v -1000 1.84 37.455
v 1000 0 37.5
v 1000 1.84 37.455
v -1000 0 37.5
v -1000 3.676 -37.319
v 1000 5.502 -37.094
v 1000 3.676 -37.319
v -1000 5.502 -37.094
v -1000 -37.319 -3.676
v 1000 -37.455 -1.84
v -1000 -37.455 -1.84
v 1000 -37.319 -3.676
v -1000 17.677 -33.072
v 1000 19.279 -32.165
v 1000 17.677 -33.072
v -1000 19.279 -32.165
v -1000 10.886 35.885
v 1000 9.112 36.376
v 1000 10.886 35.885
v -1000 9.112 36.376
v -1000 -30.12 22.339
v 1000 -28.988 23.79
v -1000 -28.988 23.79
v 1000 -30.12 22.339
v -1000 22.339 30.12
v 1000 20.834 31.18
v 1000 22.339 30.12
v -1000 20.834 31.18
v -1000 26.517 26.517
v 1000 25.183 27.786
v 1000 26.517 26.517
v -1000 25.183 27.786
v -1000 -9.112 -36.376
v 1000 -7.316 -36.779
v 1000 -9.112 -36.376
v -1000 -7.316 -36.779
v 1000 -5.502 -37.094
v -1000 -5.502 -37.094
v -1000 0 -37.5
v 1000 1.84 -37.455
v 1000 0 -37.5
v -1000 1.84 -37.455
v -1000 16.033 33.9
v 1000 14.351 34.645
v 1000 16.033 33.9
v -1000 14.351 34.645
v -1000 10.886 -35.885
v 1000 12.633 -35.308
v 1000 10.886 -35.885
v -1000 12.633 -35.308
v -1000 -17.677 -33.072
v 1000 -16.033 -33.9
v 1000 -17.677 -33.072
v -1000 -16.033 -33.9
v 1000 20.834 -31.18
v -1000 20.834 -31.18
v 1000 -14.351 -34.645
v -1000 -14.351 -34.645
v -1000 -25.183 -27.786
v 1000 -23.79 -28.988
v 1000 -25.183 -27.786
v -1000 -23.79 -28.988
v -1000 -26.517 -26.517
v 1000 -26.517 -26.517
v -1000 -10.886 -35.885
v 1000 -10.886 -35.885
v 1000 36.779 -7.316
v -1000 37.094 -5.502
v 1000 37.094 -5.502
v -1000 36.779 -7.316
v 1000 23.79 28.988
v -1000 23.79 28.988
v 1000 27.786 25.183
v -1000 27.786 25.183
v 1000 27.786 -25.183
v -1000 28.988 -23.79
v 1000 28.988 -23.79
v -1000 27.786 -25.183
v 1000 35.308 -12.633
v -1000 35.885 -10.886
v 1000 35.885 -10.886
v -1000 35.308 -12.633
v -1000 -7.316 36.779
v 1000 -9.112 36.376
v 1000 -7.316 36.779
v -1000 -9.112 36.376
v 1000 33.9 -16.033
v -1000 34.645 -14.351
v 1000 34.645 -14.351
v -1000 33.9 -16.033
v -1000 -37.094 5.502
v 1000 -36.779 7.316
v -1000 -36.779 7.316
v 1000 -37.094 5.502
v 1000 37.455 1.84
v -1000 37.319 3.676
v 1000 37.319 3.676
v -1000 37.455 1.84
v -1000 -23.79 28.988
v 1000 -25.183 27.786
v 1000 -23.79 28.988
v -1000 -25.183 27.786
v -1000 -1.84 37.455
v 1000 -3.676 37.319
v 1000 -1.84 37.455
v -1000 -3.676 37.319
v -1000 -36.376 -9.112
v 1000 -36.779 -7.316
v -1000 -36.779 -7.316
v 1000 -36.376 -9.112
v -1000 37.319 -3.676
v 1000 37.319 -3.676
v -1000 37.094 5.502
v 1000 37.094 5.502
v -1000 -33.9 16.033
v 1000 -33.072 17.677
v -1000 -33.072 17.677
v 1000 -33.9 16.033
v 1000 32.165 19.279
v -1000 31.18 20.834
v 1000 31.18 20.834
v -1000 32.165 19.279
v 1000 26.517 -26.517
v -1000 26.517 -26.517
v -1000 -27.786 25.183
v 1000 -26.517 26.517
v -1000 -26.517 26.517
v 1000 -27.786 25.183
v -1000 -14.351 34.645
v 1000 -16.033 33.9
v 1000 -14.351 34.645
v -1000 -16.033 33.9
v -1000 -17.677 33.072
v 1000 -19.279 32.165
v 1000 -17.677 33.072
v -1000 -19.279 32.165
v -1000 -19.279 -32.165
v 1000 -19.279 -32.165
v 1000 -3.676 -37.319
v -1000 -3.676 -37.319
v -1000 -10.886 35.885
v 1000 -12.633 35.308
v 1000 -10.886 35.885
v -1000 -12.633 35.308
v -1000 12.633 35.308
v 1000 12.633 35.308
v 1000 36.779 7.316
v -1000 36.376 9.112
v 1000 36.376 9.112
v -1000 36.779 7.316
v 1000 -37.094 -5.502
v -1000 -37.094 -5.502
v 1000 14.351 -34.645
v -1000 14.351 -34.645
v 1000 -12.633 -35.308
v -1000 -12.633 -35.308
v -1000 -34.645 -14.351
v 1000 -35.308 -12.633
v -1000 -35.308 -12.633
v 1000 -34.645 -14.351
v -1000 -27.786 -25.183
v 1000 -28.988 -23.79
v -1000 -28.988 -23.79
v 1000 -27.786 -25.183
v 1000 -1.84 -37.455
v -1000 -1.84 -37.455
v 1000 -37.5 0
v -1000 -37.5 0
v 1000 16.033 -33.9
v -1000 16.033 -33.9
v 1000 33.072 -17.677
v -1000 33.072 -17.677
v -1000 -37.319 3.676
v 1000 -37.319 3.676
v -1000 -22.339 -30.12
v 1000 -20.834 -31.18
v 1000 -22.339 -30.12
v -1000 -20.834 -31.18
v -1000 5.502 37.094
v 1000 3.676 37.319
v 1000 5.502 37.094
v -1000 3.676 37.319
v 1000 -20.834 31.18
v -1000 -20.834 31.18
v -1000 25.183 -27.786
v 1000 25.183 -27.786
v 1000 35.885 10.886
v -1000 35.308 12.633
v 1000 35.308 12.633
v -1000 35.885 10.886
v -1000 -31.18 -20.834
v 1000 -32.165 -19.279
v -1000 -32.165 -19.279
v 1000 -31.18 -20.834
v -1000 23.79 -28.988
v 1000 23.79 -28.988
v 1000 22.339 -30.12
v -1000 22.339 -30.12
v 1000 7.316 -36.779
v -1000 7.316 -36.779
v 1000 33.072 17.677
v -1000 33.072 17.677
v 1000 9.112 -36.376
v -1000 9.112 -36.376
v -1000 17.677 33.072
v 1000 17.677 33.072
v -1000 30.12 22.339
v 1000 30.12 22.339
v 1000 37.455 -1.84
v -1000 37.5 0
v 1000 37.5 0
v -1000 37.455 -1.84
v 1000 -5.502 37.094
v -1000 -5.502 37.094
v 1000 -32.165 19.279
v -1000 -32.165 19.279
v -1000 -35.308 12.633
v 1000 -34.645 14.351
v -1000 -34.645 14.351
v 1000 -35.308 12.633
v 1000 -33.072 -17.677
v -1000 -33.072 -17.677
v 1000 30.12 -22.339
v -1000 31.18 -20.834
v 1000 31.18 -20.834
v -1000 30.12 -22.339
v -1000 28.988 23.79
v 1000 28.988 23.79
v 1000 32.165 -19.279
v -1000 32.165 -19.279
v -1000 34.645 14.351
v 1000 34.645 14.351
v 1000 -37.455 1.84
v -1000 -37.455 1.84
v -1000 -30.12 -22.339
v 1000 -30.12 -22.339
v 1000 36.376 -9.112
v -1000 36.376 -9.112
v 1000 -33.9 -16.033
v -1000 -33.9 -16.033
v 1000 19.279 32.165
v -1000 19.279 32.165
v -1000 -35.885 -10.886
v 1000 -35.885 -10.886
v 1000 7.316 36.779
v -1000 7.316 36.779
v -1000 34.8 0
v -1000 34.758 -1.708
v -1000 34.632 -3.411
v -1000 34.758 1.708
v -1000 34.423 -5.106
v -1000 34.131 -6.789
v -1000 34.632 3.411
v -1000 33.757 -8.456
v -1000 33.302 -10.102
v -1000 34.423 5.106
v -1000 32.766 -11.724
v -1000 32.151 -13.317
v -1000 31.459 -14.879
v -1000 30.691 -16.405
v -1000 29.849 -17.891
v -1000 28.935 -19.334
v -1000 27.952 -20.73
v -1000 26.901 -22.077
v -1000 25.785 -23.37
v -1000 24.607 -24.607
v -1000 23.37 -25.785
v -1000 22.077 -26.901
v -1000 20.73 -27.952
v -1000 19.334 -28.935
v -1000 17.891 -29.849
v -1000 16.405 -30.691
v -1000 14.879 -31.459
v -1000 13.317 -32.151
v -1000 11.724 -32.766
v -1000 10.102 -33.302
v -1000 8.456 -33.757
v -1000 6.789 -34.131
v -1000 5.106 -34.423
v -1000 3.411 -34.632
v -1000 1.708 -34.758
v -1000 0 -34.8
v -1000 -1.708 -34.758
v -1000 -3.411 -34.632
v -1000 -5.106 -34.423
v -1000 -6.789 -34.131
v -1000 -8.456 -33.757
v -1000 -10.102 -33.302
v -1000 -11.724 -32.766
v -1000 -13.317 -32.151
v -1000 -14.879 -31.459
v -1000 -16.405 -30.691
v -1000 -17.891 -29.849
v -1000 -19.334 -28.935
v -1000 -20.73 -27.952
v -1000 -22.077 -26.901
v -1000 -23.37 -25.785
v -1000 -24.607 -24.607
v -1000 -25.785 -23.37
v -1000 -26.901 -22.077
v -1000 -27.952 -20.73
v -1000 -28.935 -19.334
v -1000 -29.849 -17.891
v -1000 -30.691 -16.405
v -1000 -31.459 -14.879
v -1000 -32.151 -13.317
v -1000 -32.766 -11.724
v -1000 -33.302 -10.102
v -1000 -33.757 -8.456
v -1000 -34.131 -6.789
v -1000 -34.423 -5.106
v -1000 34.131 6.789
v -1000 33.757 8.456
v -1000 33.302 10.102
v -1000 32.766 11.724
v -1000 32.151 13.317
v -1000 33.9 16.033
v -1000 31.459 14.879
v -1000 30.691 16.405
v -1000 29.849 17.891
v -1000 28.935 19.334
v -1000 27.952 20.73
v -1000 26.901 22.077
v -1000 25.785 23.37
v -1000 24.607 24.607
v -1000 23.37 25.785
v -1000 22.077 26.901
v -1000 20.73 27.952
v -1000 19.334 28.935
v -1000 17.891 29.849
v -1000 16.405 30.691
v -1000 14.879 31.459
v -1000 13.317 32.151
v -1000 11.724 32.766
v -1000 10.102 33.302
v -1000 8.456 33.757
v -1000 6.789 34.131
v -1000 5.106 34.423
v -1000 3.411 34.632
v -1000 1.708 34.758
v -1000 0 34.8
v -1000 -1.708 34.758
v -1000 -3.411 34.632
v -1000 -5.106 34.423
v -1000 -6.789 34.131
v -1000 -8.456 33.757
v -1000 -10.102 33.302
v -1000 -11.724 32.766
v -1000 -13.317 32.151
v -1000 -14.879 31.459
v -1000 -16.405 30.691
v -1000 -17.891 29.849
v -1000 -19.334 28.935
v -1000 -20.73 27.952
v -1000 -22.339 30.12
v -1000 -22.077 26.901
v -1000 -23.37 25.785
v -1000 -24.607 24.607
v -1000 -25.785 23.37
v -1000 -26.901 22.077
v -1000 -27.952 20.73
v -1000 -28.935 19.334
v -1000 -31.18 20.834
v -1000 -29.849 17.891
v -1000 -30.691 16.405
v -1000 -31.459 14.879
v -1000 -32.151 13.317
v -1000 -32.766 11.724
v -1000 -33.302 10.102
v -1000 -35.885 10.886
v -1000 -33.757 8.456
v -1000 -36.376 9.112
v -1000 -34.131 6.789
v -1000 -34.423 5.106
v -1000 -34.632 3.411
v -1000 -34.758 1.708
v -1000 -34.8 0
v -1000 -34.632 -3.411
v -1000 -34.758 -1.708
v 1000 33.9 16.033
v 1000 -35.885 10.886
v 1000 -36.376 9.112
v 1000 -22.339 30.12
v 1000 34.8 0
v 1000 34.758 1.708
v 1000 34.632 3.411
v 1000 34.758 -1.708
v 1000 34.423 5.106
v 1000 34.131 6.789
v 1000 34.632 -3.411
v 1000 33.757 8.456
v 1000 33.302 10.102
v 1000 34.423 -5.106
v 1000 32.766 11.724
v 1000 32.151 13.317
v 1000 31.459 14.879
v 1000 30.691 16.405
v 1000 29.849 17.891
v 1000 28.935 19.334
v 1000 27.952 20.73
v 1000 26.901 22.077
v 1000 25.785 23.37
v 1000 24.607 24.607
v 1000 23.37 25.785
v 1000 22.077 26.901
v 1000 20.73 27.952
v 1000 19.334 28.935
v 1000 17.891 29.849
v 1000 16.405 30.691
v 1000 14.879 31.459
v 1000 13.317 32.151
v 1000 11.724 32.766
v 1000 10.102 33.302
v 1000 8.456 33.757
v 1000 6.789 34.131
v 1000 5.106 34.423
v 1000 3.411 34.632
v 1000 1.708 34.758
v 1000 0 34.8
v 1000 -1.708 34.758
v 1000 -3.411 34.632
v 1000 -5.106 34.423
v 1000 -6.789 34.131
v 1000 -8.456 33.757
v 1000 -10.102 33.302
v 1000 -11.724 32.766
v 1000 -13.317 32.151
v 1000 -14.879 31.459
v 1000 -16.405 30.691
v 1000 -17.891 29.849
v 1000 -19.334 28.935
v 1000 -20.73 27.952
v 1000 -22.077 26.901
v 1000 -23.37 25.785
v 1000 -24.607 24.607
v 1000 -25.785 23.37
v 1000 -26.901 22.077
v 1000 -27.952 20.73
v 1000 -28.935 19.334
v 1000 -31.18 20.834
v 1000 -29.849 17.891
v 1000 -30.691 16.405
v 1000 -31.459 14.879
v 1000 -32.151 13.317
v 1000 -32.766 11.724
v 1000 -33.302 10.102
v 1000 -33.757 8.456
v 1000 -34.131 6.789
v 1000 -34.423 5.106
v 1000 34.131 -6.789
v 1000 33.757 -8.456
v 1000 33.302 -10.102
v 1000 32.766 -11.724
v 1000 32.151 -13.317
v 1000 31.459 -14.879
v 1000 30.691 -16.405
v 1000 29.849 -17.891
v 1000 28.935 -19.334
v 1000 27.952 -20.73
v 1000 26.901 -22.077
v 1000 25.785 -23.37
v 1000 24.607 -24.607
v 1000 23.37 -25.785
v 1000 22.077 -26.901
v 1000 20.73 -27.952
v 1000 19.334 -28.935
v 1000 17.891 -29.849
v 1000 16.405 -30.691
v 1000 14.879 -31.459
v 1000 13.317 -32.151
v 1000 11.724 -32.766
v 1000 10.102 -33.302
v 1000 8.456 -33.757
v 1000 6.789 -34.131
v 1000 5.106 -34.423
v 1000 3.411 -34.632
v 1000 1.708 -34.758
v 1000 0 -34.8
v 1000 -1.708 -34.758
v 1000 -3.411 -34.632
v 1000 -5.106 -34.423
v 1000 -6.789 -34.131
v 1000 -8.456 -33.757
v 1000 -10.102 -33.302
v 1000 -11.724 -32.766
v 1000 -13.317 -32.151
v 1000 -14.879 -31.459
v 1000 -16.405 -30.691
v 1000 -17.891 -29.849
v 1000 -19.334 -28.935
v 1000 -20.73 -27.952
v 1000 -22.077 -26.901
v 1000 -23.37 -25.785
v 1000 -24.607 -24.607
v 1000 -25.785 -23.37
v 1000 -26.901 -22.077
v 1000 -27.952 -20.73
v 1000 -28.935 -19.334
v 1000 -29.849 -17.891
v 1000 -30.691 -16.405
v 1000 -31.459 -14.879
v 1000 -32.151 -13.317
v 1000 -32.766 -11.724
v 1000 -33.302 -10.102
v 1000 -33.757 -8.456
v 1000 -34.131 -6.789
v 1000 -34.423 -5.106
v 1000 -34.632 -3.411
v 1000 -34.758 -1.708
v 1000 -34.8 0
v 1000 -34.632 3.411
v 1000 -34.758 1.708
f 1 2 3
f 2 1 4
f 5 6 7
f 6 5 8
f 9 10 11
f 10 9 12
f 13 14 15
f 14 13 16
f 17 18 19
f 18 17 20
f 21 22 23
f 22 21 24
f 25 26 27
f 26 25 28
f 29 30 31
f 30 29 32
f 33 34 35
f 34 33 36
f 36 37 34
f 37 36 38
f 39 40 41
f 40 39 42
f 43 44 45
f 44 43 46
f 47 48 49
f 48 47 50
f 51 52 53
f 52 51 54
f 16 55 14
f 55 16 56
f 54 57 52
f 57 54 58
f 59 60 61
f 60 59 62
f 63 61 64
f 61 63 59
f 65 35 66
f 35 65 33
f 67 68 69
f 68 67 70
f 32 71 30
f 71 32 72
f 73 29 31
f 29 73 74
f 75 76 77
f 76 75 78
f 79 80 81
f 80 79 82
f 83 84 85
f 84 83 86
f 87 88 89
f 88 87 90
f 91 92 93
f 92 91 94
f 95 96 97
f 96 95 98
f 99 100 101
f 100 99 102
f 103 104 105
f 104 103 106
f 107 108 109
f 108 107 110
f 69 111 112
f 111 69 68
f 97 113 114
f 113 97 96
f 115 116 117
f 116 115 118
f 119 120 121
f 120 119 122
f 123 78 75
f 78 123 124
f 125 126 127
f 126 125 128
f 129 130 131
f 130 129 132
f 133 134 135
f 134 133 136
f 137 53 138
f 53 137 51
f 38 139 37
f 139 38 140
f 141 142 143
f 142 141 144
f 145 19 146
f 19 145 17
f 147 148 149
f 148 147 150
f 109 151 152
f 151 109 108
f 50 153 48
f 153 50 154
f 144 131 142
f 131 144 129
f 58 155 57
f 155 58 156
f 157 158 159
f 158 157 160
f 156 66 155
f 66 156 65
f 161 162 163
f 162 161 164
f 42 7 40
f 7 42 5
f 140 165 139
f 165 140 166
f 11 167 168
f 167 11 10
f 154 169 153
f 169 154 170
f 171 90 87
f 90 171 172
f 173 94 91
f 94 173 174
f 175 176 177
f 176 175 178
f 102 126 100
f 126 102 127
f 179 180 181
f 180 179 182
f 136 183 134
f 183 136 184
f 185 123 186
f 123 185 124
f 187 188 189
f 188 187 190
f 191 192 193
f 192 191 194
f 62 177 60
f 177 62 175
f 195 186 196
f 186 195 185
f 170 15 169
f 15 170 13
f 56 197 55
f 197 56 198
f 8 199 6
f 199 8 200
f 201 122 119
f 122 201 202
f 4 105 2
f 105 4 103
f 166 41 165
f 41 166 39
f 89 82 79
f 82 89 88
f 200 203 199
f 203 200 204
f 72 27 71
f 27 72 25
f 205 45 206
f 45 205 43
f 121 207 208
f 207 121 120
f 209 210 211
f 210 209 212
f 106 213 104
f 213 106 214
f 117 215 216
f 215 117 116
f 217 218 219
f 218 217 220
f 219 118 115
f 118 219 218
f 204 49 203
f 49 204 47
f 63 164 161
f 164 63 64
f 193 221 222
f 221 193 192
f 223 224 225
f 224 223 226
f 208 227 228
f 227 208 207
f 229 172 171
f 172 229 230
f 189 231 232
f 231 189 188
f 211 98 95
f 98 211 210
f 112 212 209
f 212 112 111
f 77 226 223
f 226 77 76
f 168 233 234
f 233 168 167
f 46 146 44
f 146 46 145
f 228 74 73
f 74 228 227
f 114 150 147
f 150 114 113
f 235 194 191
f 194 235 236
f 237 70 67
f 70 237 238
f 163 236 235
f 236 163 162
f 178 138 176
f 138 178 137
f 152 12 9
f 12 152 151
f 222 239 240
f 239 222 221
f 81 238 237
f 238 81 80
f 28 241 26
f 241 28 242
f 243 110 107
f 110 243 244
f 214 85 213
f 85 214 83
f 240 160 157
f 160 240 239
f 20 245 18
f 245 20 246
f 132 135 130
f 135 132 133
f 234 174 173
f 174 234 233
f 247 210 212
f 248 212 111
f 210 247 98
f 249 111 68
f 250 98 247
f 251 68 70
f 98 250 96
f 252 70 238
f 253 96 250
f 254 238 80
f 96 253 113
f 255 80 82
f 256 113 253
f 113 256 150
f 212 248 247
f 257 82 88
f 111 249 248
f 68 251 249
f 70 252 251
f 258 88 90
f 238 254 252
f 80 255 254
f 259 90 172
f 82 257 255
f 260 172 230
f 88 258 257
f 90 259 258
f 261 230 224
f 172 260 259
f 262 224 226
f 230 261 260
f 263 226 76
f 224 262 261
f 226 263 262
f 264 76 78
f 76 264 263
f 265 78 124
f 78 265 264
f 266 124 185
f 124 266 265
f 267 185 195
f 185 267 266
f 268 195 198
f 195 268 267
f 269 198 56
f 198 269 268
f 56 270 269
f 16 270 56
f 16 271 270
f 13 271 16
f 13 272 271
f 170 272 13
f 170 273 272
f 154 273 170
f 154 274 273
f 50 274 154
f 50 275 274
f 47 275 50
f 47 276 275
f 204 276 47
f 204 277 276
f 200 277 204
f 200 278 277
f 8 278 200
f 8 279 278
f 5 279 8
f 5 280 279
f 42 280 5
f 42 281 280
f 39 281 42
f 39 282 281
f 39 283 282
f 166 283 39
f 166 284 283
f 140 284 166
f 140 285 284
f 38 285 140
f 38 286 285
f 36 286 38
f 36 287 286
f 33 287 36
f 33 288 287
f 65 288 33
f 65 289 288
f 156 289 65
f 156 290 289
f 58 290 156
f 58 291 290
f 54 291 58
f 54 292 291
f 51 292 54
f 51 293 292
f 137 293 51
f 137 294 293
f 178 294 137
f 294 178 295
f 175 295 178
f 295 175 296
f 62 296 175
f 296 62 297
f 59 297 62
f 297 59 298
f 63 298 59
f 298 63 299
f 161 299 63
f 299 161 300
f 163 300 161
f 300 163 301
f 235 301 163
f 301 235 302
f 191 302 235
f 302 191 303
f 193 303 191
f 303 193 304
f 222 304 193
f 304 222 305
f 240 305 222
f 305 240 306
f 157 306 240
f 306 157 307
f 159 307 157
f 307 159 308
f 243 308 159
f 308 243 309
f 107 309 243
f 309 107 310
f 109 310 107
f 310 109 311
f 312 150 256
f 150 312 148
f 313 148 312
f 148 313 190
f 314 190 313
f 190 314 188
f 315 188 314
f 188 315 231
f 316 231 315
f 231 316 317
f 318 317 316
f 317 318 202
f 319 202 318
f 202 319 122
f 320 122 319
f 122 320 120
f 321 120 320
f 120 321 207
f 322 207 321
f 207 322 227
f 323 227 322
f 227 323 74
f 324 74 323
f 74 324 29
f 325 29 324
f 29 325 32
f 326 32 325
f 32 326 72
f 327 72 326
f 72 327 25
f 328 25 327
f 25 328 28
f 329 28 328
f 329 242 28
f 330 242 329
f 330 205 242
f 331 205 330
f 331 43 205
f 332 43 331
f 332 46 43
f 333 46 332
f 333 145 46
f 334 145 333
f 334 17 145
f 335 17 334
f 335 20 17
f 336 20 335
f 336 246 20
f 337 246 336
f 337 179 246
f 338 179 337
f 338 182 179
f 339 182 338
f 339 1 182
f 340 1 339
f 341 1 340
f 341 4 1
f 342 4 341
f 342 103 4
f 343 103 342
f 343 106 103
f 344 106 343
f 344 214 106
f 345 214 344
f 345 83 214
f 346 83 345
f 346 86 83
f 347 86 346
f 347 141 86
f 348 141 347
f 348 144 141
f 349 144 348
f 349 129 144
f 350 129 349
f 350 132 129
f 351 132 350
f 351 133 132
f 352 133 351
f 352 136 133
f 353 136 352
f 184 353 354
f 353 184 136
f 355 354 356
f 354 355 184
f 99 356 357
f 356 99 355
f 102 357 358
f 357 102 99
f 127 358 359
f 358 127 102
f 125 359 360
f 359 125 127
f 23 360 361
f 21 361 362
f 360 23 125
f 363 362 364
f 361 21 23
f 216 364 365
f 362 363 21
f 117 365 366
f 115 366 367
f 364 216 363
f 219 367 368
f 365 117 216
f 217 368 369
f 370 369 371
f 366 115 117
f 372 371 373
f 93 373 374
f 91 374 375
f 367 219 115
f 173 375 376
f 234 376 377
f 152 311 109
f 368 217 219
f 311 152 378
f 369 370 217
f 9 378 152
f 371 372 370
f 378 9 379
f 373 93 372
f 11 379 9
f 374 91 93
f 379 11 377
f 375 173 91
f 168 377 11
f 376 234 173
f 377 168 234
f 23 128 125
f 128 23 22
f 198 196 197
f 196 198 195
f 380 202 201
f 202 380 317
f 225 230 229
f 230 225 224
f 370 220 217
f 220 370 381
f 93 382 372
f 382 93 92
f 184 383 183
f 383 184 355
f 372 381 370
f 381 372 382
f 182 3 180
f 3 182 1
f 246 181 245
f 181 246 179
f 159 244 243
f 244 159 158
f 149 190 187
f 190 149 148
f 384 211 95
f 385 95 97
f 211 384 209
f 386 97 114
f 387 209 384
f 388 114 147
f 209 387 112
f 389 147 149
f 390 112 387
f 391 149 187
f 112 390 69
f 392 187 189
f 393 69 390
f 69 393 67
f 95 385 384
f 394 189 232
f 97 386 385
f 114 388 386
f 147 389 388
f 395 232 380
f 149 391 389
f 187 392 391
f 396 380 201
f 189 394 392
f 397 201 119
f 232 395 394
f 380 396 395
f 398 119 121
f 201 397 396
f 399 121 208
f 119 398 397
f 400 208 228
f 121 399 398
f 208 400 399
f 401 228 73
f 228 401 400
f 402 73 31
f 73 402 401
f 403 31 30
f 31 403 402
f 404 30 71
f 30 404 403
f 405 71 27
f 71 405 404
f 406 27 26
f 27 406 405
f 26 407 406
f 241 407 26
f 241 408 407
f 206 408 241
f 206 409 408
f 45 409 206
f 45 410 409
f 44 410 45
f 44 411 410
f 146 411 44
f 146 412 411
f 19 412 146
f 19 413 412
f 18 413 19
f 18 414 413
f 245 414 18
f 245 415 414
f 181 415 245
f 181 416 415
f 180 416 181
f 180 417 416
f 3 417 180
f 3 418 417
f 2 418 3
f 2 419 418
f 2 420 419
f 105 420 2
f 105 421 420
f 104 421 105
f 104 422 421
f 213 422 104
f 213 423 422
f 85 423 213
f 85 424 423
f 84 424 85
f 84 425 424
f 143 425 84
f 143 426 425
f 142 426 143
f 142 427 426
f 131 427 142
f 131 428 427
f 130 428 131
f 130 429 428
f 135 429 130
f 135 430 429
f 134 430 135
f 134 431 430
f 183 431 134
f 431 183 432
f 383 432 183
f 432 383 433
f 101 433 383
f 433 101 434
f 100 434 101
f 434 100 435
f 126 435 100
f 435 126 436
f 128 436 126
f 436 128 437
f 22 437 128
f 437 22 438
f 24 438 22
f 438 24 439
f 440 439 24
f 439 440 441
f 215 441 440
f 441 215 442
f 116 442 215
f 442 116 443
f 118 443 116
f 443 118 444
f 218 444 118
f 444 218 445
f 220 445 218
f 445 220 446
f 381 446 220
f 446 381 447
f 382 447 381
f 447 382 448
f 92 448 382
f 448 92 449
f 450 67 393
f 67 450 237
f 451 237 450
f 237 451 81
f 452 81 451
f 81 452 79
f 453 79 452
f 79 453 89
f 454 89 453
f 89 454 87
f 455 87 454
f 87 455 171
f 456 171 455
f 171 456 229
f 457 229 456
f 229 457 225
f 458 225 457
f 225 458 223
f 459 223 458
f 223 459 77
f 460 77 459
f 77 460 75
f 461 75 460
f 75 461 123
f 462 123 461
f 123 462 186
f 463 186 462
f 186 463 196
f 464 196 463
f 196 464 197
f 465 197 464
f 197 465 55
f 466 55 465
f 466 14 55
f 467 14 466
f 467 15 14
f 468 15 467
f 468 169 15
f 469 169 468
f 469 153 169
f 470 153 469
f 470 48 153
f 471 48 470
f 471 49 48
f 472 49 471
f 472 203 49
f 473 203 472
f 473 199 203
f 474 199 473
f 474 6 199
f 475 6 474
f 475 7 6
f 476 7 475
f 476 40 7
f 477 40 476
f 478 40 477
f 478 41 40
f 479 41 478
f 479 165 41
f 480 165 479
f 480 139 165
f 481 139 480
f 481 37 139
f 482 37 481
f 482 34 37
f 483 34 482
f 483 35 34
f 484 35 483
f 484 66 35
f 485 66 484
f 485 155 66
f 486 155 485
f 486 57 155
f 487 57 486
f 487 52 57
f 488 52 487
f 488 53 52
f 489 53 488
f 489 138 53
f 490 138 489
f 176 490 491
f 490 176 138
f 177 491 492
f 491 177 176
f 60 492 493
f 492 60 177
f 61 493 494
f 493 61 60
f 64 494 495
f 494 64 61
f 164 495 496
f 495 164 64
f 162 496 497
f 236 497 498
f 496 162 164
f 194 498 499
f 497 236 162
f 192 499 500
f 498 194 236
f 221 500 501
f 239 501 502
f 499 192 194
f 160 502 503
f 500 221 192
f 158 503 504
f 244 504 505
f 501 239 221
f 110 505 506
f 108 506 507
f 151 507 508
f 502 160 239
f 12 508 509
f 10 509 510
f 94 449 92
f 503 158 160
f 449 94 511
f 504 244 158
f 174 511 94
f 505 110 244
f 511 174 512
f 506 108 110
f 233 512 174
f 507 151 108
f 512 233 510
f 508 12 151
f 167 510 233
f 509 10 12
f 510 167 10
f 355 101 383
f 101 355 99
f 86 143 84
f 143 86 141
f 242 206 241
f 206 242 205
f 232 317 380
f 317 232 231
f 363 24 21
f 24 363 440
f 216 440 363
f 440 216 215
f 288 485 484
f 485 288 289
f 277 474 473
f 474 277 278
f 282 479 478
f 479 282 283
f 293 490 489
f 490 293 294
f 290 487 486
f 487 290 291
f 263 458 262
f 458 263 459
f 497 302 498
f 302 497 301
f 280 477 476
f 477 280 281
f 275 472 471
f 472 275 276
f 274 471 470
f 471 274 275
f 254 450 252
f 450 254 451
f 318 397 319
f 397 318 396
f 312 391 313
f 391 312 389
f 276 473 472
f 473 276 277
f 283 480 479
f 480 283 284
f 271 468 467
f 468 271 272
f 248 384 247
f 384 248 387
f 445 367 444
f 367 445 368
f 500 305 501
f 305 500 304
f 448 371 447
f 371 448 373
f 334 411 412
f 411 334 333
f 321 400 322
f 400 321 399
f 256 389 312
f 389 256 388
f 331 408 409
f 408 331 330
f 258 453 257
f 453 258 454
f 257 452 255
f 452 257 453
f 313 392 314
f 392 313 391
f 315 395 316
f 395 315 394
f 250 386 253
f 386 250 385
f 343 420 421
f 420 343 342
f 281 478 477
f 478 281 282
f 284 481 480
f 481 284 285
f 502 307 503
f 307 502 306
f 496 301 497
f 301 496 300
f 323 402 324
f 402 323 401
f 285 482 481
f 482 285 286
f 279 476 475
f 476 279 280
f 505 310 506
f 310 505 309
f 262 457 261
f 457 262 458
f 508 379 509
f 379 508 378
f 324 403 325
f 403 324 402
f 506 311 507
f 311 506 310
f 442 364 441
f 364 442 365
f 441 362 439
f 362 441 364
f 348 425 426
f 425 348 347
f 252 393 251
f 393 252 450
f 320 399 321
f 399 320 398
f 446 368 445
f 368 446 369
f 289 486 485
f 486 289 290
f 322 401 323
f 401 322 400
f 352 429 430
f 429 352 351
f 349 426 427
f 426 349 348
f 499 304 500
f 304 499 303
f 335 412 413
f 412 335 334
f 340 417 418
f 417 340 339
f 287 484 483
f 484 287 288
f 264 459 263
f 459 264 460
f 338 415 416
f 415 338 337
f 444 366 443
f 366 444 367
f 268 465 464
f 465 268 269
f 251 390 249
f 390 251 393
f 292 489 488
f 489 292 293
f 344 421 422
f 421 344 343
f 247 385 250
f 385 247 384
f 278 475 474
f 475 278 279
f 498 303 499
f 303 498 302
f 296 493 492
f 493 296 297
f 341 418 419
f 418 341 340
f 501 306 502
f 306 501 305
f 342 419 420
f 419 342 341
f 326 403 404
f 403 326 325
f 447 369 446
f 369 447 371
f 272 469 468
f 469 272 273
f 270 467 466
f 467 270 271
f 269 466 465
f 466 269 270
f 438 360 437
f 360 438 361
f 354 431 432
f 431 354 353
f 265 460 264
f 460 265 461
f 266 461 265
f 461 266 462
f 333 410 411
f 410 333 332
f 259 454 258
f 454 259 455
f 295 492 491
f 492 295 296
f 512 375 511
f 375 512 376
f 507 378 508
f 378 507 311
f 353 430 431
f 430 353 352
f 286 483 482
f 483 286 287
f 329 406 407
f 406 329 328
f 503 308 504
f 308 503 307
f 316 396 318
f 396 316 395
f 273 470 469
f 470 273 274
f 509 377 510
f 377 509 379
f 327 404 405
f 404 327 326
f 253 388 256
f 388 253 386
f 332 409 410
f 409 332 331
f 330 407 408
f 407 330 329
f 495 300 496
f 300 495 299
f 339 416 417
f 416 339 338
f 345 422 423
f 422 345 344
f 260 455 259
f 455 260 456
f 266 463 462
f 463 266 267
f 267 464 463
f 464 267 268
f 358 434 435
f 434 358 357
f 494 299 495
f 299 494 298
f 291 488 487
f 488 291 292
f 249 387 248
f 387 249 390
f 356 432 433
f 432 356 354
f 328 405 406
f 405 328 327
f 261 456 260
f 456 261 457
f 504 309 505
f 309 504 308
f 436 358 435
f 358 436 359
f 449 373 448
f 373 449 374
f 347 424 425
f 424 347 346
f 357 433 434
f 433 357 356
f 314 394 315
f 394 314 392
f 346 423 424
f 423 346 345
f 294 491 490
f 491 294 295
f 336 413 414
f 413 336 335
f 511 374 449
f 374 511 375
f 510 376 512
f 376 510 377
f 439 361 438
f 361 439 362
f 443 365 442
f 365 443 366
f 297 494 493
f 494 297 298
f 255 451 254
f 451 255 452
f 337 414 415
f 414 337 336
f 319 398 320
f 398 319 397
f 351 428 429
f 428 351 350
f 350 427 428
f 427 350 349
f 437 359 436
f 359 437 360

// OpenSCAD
$fn = 128;

// HT pipe parameters (mm)
outer_d = 75;        // outer diameter
length  = 2000;      // pipe length
wall    = 2.7;       // wall thickness
inner_d = outer_d - 2*wall;

module ht_pipe(od, id, L){
    eps = 0.2; // small overlap to avoid coincident faces
    difference(){
        // Orient pipe along X so side/front/back views show the tube clearly
        rotate([0, 90, 0])
            cylinder(h=L, d=od, center=true);

        // Inner void slightly longer to ensure clean subtraction at both ends
        rotate([0, 90, 0])
            cylinder(h=L + 2*eps, d=id, center=true);
    }
}

ht_pipe(outer_d, inner_d, length);
